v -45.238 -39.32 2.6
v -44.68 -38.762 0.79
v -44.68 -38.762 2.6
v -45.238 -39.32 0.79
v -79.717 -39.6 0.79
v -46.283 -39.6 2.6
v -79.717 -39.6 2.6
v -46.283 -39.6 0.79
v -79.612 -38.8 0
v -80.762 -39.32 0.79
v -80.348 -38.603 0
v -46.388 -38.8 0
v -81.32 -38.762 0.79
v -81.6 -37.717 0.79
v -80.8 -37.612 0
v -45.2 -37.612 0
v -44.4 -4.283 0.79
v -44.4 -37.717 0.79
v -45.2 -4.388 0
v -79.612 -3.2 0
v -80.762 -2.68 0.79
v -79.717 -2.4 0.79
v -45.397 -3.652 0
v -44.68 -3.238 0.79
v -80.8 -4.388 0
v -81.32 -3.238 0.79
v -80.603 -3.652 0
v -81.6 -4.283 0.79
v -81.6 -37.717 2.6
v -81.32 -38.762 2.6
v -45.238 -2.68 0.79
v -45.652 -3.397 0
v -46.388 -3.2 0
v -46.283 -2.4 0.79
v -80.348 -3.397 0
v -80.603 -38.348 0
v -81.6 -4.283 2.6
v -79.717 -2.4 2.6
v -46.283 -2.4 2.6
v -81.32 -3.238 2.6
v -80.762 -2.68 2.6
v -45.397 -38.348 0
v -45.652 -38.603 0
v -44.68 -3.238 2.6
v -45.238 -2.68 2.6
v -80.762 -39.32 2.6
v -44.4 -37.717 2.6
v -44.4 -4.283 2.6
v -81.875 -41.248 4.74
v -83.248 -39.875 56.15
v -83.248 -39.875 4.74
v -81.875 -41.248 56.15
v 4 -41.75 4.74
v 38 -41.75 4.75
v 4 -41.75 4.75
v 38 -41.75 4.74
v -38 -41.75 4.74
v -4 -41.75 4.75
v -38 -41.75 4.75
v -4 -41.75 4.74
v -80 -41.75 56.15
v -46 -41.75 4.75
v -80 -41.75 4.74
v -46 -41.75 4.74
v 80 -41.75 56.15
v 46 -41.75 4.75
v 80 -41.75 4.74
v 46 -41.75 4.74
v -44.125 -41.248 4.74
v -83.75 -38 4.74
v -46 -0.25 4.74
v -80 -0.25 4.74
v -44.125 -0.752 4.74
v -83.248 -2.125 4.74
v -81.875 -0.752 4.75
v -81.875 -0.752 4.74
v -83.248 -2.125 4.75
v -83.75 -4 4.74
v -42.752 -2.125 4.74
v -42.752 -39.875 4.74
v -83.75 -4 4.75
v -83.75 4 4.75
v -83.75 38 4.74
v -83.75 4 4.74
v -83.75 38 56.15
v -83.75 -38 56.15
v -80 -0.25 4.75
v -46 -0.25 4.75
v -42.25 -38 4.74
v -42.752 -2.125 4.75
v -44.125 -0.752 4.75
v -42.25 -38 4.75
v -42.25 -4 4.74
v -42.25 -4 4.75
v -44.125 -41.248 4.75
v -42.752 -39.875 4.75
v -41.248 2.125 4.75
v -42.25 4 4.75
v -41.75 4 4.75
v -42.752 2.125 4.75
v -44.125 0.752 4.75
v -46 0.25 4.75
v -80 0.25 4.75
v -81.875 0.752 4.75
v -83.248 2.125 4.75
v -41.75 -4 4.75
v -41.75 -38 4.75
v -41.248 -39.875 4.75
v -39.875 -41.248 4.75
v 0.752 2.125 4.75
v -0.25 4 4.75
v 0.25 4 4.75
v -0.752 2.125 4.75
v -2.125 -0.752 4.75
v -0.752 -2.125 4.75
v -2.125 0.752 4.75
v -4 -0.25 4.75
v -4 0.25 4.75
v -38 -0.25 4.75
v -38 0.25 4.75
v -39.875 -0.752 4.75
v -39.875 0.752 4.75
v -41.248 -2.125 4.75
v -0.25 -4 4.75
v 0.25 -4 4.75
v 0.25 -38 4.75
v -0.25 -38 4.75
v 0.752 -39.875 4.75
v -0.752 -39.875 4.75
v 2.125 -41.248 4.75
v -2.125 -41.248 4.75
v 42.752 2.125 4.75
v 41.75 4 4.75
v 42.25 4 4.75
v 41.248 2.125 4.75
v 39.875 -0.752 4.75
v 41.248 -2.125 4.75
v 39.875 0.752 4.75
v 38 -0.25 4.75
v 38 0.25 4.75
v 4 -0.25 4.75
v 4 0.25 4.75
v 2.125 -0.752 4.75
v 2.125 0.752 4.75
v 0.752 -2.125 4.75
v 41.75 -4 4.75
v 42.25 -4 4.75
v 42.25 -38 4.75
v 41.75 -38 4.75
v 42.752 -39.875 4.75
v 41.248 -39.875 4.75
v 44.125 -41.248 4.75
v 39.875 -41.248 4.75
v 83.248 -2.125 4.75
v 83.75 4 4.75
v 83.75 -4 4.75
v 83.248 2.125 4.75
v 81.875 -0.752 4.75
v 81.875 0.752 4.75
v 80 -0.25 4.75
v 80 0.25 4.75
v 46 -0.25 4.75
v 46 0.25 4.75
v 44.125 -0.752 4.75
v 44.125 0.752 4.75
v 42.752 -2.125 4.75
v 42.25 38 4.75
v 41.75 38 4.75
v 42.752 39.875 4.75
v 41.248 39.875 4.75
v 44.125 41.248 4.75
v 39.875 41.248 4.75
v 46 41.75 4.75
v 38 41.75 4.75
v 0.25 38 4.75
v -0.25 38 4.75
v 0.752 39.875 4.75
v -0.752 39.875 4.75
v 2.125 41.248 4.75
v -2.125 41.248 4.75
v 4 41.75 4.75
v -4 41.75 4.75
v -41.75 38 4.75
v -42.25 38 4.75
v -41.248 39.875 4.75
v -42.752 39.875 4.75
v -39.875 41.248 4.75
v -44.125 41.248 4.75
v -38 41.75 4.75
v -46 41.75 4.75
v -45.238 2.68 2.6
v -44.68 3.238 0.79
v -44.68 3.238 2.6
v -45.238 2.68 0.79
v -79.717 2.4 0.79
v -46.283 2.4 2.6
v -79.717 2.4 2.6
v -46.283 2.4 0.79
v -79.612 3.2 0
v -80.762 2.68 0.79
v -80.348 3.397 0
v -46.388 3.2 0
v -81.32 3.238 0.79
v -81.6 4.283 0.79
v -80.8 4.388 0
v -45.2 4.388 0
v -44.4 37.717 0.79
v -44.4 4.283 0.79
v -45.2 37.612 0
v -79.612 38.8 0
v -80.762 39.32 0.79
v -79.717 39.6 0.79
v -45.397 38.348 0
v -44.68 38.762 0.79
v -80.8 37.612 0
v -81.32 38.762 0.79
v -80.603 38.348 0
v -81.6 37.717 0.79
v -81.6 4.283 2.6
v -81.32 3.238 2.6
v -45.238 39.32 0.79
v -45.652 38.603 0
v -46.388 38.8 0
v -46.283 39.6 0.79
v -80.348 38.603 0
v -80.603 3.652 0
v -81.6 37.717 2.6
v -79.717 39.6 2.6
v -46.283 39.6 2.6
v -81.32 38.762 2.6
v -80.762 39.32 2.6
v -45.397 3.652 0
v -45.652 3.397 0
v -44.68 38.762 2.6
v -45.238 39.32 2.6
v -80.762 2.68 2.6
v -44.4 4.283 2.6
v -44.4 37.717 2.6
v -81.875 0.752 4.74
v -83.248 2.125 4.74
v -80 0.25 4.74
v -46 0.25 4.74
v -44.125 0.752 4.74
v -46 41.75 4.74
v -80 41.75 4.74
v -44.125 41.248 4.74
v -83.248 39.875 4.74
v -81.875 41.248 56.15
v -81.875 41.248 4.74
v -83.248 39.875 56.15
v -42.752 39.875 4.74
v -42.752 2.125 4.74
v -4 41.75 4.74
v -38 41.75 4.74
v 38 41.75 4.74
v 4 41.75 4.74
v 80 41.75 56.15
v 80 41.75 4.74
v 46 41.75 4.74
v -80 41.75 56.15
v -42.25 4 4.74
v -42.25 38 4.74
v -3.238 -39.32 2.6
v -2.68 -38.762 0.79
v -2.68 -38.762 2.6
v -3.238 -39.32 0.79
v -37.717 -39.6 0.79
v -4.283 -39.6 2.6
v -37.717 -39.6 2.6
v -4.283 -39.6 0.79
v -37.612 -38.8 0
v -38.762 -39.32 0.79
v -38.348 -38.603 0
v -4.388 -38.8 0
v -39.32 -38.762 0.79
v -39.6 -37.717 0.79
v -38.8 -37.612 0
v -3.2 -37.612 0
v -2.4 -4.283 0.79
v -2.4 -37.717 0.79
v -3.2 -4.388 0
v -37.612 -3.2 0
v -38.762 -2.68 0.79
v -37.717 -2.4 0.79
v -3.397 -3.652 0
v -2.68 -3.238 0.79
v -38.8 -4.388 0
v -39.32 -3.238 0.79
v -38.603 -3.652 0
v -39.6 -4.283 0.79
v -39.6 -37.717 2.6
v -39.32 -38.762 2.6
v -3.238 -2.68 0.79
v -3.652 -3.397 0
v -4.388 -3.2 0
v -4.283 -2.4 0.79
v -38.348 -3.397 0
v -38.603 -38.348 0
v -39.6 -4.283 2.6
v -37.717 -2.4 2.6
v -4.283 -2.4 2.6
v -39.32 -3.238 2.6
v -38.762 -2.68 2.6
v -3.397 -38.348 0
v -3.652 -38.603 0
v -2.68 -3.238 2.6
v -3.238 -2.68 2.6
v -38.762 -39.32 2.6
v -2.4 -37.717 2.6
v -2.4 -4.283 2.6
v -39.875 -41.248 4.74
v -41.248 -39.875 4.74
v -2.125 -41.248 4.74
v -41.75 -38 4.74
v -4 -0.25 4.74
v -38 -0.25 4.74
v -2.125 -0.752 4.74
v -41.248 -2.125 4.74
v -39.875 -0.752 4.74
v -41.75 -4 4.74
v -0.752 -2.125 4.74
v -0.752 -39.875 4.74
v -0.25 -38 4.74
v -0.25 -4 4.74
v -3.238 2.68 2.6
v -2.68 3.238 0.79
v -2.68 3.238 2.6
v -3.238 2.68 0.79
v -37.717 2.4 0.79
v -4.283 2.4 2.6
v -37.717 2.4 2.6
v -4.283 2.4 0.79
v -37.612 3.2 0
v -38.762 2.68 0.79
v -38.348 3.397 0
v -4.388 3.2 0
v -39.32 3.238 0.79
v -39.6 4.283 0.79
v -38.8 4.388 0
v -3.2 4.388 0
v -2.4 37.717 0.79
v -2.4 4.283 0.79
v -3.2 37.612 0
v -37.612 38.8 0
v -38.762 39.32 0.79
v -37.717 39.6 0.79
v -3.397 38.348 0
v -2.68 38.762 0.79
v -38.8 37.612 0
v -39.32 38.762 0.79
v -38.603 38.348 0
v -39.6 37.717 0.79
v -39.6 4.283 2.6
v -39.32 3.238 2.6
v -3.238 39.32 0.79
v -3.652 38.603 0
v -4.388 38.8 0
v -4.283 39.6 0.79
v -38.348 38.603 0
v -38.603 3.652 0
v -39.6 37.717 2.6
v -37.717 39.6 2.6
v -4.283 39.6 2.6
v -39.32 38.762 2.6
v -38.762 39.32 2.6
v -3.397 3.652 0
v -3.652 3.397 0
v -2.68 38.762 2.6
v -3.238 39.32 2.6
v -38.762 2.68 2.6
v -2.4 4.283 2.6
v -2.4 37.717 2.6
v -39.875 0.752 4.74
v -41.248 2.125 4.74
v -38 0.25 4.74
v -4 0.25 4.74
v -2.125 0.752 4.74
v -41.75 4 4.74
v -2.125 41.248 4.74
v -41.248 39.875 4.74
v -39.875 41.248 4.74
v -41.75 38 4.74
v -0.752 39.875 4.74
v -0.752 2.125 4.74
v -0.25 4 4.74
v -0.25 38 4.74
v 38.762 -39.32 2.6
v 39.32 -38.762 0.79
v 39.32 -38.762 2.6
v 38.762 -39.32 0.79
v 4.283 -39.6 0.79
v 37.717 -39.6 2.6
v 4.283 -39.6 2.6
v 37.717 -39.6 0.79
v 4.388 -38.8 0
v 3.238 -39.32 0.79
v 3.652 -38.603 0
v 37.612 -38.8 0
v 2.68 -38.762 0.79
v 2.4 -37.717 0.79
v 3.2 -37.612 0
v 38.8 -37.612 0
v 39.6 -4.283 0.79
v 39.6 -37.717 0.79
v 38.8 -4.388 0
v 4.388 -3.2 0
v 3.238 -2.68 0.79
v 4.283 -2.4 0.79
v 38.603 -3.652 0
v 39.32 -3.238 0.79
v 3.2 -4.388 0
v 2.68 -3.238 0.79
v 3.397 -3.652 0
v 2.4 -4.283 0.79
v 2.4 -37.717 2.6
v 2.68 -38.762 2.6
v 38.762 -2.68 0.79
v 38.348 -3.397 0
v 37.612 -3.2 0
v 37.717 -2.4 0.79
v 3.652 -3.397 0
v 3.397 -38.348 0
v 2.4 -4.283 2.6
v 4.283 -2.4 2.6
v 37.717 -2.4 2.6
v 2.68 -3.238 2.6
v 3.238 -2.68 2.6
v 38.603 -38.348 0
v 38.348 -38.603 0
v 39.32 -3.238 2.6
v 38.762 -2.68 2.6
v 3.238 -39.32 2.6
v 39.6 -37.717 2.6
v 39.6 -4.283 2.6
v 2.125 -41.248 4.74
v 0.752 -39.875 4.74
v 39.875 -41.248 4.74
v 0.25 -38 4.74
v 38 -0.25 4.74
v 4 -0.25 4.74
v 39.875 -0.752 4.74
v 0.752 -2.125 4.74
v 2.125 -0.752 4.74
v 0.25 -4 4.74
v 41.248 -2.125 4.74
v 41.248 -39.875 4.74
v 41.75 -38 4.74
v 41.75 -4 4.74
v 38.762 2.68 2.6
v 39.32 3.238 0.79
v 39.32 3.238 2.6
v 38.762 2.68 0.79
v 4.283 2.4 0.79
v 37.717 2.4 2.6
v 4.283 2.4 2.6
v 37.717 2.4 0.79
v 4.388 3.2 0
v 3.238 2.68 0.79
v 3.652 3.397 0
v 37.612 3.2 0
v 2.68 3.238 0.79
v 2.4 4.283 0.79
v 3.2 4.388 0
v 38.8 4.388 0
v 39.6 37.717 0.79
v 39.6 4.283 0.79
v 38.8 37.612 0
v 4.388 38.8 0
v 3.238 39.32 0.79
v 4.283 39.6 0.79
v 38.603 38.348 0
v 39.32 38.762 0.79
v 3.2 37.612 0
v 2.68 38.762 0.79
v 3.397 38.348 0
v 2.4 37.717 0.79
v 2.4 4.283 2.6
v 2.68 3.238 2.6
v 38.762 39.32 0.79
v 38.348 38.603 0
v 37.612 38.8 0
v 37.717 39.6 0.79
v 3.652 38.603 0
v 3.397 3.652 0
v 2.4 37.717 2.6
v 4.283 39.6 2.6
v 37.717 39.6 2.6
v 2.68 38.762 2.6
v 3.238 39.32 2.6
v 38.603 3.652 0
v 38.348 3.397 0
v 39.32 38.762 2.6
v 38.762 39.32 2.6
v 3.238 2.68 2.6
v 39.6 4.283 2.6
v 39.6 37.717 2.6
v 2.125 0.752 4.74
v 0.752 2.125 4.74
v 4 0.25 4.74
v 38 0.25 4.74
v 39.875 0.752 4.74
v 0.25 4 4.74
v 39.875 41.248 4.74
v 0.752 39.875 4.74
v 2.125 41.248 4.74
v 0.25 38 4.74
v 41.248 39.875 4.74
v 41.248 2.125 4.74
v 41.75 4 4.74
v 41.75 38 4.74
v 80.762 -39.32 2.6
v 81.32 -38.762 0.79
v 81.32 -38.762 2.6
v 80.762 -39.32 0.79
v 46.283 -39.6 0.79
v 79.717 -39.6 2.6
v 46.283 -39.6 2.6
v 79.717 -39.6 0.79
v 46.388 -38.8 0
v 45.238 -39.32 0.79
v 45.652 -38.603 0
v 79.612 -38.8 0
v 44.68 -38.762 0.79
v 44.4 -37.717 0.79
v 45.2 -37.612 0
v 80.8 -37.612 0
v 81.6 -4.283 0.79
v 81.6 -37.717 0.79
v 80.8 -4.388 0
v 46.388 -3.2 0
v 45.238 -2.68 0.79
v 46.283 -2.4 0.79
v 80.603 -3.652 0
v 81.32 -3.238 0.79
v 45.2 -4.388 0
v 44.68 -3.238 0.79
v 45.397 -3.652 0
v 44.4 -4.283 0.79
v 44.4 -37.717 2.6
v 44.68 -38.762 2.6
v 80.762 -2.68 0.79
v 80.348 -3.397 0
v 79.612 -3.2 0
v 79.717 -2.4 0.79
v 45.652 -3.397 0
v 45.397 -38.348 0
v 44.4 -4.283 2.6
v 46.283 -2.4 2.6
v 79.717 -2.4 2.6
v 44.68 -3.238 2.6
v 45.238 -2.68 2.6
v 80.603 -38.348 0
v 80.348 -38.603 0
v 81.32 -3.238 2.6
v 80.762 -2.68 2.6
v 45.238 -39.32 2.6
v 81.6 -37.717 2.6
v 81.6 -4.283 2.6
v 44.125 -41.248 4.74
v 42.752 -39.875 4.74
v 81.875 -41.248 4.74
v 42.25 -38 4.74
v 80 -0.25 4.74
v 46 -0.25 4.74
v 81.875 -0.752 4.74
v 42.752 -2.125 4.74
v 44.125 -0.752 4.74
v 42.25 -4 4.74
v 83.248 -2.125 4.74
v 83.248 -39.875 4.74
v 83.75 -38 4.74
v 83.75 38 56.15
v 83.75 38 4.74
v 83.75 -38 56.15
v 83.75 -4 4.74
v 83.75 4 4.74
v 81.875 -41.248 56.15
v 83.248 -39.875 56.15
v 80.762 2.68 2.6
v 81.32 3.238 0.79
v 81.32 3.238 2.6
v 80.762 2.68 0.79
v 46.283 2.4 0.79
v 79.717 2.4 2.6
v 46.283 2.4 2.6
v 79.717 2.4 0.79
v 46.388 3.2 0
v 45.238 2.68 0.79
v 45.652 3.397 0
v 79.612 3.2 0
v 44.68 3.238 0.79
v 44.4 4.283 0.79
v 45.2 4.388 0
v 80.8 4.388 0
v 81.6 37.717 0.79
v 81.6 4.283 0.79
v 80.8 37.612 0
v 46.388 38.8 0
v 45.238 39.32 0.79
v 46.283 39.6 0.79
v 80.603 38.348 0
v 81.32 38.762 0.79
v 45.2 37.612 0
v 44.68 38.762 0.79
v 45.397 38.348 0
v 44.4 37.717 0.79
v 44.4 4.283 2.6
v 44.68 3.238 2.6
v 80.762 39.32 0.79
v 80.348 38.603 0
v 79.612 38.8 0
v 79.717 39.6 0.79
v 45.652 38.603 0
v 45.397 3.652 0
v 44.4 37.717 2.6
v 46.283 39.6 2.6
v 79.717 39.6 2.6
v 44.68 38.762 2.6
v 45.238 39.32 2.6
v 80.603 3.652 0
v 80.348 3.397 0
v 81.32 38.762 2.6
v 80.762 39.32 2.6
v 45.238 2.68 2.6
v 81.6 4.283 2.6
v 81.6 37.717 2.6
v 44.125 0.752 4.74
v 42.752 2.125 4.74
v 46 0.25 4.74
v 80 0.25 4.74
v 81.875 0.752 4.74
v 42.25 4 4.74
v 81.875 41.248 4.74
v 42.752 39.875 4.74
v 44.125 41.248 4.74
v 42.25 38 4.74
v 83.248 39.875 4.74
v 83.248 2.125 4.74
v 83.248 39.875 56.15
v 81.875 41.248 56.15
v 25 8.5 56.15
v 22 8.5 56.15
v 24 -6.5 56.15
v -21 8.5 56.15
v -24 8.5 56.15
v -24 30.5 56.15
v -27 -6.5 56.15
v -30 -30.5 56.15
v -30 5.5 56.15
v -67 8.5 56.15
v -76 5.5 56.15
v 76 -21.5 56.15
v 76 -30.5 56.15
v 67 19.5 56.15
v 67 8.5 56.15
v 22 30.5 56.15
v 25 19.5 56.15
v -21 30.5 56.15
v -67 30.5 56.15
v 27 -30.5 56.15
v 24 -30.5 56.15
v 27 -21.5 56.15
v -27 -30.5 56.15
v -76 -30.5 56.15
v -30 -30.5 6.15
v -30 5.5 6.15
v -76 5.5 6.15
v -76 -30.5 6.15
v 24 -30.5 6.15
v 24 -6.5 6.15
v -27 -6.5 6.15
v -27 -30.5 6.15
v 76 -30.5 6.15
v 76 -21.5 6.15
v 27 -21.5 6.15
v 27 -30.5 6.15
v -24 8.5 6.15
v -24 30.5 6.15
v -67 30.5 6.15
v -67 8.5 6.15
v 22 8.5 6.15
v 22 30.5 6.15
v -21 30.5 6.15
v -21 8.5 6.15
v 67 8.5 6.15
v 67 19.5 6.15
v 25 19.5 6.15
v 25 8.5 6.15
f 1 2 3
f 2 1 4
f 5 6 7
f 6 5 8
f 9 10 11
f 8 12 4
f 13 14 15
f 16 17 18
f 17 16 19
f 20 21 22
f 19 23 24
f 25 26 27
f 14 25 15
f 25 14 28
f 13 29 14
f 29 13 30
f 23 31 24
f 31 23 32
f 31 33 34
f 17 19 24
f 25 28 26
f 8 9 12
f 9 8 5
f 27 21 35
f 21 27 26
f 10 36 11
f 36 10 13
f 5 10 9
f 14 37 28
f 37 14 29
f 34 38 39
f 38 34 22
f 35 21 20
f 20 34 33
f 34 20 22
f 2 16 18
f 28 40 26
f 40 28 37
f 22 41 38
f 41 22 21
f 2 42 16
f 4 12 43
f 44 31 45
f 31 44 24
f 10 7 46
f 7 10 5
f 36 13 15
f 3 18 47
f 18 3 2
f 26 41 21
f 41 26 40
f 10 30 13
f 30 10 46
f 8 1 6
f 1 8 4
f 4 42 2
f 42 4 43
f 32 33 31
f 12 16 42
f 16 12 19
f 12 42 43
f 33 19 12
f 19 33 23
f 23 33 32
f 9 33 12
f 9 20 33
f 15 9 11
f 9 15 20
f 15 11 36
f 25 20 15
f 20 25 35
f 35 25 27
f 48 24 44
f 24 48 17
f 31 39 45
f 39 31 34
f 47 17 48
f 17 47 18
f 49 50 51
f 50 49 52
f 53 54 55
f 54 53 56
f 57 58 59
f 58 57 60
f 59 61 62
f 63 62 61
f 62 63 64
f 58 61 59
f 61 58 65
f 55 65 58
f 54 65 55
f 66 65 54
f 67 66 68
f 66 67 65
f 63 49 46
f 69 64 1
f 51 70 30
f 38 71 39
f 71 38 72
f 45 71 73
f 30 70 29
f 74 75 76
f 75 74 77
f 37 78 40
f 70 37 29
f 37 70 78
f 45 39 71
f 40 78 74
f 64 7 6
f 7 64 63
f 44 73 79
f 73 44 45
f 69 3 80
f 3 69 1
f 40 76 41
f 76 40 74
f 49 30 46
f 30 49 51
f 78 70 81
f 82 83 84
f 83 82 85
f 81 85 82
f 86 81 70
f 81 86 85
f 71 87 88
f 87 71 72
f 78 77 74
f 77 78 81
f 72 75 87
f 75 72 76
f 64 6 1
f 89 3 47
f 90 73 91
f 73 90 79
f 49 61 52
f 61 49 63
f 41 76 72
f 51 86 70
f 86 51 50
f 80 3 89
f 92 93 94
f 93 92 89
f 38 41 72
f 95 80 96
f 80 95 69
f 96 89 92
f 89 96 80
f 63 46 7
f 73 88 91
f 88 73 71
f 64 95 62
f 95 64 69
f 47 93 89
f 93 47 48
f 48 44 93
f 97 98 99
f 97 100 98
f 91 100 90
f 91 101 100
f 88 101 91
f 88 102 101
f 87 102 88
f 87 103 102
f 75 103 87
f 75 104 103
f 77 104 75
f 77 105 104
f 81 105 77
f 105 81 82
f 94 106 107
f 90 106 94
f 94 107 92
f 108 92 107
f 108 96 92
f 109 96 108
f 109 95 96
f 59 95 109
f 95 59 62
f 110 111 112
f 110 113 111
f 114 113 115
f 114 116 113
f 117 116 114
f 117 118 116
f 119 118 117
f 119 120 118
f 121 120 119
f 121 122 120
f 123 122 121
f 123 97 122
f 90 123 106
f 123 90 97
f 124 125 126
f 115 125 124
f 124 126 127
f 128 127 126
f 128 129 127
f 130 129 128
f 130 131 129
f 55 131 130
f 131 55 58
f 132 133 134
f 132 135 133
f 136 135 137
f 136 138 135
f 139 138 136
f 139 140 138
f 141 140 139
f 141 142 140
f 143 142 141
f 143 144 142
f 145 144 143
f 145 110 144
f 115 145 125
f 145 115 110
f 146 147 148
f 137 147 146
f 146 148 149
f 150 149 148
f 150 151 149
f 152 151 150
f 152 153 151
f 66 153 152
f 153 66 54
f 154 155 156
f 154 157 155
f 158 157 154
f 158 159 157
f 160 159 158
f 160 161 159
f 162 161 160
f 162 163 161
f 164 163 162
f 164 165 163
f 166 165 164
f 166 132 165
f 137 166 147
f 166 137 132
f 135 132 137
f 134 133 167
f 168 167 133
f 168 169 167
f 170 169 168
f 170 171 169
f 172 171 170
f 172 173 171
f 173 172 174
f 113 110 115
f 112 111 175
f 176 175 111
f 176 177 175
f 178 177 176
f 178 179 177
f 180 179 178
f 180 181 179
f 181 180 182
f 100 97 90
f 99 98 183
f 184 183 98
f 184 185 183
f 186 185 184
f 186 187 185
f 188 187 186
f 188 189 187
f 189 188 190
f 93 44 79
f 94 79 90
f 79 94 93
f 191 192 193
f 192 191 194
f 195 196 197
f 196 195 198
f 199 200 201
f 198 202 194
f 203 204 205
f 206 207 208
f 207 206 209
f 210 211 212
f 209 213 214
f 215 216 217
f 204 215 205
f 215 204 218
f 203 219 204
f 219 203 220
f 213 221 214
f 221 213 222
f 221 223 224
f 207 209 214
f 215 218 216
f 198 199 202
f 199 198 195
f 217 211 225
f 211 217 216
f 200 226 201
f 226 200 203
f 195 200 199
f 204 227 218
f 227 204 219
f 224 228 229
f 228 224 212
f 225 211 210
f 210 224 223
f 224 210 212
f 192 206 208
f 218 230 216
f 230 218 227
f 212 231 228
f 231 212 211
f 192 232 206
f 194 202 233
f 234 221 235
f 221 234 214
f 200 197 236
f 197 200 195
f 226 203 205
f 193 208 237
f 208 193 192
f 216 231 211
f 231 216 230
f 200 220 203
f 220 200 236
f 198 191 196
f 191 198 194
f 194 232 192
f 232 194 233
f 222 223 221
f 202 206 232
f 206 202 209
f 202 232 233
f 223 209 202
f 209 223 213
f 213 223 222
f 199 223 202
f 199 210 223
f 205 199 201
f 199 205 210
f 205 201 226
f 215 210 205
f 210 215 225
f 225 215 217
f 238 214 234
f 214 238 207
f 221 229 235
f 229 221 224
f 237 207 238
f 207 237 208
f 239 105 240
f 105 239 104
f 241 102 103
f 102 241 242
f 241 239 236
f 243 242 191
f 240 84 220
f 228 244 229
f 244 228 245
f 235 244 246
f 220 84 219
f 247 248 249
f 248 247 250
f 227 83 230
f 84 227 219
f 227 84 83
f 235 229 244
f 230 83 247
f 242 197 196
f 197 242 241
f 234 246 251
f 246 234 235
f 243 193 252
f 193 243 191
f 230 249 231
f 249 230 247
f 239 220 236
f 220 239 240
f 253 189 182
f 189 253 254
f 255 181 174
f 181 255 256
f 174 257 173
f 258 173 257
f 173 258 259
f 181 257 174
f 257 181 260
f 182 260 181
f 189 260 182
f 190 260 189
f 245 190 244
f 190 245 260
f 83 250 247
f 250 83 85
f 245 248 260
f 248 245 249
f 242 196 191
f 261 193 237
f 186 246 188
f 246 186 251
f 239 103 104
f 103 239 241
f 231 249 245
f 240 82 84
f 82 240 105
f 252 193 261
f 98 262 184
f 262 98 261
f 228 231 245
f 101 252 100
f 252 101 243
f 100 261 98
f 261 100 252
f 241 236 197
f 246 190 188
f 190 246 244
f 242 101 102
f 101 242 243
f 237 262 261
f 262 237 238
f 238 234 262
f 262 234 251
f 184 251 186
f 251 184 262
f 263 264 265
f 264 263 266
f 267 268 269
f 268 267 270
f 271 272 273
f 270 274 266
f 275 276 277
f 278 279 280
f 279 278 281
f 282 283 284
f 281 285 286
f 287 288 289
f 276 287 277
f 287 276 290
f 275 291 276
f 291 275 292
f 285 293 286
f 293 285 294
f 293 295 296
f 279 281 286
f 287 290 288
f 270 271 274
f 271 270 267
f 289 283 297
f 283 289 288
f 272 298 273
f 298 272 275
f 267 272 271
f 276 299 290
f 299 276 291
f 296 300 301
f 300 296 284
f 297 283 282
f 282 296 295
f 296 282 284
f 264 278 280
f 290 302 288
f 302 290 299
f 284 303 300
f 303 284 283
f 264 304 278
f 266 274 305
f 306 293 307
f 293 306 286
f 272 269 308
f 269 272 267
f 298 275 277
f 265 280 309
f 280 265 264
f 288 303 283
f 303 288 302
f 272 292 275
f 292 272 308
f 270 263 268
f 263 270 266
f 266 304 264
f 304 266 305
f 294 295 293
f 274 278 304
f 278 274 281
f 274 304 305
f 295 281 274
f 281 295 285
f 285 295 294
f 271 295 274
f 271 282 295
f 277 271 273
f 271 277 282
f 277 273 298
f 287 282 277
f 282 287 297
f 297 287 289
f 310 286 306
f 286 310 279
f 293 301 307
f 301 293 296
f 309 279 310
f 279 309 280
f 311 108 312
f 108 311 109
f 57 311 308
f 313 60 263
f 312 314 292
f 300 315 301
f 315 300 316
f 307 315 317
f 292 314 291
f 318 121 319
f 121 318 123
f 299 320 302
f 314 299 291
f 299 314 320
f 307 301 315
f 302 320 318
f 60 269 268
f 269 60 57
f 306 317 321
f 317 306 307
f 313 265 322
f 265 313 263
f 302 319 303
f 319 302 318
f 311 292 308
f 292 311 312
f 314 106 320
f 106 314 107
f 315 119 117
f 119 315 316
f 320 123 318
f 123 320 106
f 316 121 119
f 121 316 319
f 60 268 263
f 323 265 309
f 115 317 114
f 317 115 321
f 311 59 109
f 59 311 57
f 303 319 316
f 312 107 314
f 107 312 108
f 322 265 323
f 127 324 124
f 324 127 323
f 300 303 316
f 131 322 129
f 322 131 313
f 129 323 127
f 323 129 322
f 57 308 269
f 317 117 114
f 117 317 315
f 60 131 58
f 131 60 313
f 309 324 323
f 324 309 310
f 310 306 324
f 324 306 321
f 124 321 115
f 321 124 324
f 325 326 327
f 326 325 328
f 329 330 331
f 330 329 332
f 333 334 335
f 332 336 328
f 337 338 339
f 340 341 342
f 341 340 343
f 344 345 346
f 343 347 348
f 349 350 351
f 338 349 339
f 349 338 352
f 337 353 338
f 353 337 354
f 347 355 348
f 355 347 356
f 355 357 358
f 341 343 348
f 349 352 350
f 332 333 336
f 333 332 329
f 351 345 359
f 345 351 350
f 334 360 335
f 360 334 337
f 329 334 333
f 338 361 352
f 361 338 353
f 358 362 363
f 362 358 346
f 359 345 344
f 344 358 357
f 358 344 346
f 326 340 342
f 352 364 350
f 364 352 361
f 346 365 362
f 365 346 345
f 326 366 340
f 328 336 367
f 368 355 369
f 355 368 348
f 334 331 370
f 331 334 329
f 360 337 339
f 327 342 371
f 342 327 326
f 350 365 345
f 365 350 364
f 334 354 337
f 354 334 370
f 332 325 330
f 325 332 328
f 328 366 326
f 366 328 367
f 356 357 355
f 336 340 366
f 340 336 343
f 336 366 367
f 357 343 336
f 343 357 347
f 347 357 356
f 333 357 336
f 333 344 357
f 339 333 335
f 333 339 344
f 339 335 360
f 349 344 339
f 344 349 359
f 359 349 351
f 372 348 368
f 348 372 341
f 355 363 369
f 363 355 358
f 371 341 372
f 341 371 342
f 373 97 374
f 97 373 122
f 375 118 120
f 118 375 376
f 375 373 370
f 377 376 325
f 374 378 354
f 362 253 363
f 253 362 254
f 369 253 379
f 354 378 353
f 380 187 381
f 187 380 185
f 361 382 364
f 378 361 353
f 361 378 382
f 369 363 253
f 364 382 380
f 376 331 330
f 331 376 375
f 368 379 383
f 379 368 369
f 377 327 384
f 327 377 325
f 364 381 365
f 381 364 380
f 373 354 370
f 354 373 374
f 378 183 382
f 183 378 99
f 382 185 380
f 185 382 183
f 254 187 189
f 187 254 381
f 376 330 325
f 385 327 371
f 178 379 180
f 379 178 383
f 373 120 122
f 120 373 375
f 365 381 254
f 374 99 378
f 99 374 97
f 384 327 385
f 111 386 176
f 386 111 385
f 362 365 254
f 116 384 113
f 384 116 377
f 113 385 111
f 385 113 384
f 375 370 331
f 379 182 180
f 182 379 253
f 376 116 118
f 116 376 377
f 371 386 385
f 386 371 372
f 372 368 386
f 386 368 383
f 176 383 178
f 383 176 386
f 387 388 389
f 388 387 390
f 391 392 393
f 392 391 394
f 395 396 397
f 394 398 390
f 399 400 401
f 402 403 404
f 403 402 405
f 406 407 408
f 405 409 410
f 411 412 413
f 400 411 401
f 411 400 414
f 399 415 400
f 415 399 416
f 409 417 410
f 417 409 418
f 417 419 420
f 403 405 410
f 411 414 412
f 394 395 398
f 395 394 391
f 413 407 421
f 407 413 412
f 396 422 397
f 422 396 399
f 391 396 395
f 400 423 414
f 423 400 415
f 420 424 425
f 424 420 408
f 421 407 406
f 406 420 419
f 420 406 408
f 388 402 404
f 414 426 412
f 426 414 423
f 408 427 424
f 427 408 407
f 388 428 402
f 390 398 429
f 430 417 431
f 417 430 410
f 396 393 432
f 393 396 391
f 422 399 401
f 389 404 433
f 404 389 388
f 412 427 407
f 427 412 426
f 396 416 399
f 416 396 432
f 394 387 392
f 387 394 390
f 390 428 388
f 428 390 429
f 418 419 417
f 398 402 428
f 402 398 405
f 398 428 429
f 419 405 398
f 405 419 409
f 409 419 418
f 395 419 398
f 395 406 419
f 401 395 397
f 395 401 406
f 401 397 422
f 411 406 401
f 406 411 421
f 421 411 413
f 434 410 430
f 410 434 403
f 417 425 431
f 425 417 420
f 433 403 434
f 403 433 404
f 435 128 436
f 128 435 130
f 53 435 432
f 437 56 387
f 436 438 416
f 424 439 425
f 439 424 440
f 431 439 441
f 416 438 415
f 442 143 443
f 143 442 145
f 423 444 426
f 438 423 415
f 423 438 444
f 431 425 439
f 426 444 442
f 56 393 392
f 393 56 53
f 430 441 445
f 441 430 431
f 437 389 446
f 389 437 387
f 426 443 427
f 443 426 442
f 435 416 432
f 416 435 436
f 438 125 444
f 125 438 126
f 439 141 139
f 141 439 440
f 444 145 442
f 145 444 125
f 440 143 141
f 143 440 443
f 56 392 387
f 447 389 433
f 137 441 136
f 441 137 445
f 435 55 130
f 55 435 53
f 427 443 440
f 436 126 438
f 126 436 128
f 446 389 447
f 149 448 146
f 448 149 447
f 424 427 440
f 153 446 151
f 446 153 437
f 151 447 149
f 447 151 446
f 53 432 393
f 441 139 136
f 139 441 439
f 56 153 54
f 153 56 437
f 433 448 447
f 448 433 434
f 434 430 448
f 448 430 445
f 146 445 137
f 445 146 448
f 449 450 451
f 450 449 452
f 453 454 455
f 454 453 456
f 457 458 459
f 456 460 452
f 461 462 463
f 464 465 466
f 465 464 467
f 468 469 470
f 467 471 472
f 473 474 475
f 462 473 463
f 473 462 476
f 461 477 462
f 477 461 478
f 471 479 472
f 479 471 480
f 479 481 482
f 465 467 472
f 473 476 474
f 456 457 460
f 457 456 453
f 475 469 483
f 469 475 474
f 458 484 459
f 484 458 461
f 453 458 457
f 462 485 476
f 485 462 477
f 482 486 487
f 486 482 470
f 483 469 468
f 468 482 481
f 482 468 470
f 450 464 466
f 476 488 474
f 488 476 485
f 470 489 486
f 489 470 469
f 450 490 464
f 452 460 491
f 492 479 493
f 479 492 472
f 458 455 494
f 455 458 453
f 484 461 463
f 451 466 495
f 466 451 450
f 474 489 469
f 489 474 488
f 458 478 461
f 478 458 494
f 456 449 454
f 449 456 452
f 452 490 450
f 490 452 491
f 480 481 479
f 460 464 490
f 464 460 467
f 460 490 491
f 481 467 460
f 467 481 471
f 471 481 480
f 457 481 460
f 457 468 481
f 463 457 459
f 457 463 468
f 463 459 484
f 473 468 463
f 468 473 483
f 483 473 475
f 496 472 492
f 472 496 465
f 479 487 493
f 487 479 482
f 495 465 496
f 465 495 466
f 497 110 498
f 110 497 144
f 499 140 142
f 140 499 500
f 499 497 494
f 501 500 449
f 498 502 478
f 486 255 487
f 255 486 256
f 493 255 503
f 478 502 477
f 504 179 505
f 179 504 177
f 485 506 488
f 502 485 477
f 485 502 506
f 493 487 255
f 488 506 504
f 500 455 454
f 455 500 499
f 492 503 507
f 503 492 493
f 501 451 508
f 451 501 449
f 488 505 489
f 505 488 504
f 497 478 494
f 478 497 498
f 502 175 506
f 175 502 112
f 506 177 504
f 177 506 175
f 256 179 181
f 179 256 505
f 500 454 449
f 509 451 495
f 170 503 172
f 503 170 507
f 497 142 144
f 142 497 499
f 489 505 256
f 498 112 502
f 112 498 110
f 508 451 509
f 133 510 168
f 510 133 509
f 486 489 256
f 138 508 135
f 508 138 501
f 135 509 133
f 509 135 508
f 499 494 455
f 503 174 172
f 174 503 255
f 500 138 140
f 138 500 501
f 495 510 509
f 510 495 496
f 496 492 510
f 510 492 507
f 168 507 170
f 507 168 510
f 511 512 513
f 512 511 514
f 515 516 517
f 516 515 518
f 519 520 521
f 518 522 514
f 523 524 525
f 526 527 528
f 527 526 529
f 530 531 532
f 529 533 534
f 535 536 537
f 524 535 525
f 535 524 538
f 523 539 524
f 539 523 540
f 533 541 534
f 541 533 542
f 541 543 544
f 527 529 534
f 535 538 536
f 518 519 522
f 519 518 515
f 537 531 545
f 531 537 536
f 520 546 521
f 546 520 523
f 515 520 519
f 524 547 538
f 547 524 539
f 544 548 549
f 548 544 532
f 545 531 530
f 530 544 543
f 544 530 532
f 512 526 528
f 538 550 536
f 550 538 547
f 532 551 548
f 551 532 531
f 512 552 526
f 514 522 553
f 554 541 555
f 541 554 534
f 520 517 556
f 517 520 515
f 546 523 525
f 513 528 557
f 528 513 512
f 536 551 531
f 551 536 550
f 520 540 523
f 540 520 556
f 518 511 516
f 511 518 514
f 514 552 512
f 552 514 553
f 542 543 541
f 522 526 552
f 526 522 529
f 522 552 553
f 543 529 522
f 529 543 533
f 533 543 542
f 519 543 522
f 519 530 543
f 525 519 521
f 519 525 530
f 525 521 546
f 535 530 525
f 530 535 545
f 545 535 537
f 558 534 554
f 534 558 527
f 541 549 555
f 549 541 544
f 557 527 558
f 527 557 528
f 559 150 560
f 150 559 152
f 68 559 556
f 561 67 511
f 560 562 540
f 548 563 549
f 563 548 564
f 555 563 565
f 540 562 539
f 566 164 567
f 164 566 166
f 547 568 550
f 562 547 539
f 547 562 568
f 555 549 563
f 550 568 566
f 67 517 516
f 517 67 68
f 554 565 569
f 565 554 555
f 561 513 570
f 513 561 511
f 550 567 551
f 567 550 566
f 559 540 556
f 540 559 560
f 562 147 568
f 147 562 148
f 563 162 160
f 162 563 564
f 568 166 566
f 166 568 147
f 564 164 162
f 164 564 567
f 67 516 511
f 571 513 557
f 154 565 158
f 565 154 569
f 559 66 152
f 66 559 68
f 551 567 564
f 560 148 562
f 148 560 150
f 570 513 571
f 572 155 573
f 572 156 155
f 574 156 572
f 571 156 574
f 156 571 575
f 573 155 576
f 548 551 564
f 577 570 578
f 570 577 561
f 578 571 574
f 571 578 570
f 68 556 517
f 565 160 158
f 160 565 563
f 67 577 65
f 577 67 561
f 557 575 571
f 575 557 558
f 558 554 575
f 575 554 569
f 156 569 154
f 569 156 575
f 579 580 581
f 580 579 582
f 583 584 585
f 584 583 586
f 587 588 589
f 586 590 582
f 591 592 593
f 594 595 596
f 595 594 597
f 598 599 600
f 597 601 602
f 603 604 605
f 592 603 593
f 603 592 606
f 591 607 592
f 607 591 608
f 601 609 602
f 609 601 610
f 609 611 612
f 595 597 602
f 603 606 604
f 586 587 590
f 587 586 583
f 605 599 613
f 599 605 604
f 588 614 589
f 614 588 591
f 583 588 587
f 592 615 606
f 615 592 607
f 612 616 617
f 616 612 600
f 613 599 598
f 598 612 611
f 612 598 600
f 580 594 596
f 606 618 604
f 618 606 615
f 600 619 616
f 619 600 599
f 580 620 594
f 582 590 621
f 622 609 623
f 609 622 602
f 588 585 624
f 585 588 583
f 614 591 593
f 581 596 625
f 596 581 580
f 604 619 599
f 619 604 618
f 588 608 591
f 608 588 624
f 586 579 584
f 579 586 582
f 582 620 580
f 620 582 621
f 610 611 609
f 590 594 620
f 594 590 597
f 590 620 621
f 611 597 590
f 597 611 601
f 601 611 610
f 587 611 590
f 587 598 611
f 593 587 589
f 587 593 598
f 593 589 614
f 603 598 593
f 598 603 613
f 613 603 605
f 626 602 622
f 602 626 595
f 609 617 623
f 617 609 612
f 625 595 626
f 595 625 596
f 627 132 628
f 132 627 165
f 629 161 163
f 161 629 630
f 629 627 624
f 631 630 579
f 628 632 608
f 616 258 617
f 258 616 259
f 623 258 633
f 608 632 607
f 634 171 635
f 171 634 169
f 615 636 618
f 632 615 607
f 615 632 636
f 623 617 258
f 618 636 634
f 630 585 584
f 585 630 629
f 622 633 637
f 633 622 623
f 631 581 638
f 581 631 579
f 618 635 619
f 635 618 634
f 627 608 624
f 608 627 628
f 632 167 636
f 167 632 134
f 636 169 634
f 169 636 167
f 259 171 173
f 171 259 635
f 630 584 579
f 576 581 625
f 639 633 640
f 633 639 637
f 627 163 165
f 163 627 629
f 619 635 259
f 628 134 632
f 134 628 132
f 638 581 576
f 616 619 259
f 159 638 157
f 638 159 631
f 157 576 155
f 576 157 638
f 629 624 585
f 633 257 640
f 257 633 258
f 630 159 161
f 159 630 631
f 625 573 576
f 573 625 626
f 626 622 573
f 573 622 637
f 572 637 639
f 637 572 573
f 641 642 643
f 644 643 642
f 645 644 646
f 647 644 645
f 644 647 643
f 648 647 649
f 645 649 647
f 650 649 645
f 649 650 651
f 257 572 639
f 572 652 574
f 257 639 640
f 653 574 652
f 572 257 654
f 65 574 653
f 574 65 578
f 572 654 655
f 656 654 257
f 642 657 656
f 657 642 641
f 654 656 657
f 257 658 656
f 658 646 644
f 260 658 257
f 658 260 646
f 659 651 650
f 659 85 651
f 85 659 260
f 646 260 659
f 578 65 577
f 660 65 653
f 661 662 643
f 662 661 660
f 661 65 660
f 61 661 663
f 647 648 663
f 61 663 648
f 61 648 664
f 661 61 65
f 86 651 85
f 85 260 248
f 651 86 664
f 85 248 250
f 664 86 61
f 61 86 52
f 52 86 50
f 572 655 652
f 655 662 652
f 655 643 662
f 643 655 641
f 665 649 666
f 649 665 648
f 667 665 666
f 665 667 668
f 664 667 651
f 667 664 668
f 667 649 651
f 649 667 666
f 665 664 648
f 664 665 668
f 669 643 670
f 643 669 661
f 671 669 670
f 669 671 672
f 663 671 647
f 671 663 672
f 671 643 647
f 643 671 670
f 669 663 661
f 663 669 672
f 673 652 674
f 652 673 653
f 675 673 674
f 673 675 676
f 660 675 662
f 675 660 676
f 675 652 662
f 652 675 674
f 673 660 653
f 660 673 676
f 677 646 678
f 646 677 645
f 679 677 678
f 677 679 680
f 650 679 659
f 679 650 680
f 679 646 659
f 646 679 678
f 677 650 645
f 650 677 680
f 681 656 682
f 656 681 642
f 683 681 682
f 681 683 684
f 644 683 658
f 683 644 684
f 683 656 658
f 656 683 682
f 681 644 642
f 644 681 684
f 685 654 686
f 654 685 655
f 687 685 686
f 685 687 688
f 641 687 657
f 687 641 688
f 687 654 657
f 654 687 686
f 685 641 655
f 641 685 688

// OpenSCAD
// tray_remotes — 4×2 tray, two rows of three, one sized slot per remote,
// each standing on end.
//
// HOW YOU USE IT:
//   Each remote stands upright in its own slot, cut to that remote's width and
//   thickness. You grab the one you want by the top and lift it straight out.
//   Nothing has to be moved to reach anything else, and a remote can only go back
//   in its own slot. Every remote stands 40 mm or more proud of the tray, so the
//   back row is grabbed over the front row, not dug out from behind it.
//
// WHY SLOTS AND NOT ONE BIN: six remotes in a common well fall over each other
// and you dig. The narrowest here is 8 mm thick and the widest 35 — in a shared
// well the thin ones just lie down.
//
// WHY TWO ROWS, AND WHY THE 6×1 IS GONE. There are TWO Roku remotes, not one.
// Six remotes are 268 mm of width; with clearance and 3 mm dividers that is
// 289 mm of slot. A 6×1 has 249.1 mm of interior — short by 40. The width that
// would hold them is a 7×1 at 293.5 mm outer, which is past the 270 bed. So the
// row folds in half: 4×2, three slots front, three back.
//
// That also buys back the dividers. The 6×1 ran DIV = 2 because at 3 it needed
// 249.0 against 249.1 available, which is not a fit, it is a coincidence. The
// 4×2's widest row needs 152 of 165.1, so the dividers go to the usual 3 mm and
// stop being the thing holding the design together.
//
// ROWS ARE SPLIT BY THICKNESS, not by which remote you use most. Each row is
// only as deep as its own thickest member, so putting the 35 mm LG and the 8 mm
// fume extractor in the same row costs nothing, while spreading the thick ones
// across both rows would make both rows 36 mm deep and blow the Y budget.
//
// SLOTS ARE FRONT-ALIGNED WITHIN A ROW. The faces present at one line, so each
// row reads as a row. Back-aligning would stagger the fronts and bury the thin
// ones.
//
// PRINT: as emitted, feet down. No supports.
//
// SPDX-License-Identifier: CC-BY-NC-4.0
// Copyright (c) 2026 Aaron Cupp
include <../lib/gridfinity.scad>

CLR    = 1.0;   // [0.5:0.1:2] per dimension, on both width and thickness

// ⚠️ BUTTON_BULGE IS AN ALLOWANCE, NOT A MEASUREMENT.
//
// The Insignia jammed on its own buttons the moment it entered the slot. 20 mm
// is the thickness of the BODY; the feature that actually has to pass through
// the slot is the button crown, which stands proud of it and was never measured.
// This is the tip-tinner bug again — the 42.5 mm lid was measured where the
// 38.38 mm body was the thing that had to fit.
//
// 3.0 is a guess at a rubber-button crown, giving 4.0 mm of total thickness
// clearance where the body alone would get 1.0. If it still catches, the fix is
// NOT to raise this further by feel: put calipers across the remote AT THE
// BUTTONS and make that the thickness in the table.
BUTTON_BULGE = 3.0;   // [0:0.5:6]

// [name, width, thickness, extra thickness allowance]
// Widths and thicknesses measured 2026-08-20. Lengths run 90 to ~180 mm.
ROWS = [
    // back row — depth set by the 35 mm LG
    [["LG 4K TV",    45, 35, 0],
     ["Insignia TV", 50, 20, BUTTON_BULGE],
     ["Fume ext",    48,  8, 0]],
    // front row — depth set by the Rokus
    [["Roku",        42, 21, 0],
     ["Roku",        42, 21, 0],
     ["Scope cam",   41, 10, 0]],
];

NX = 4; NY = 2;
CAPTURE = 50;   // [30:1:80] slot depth, and a compromise between two ends of the
                //   range. The shortest remote is 90, so 50 holds over half of it
                //   and still leaves 40 to grab; go deeper and the short ones get
                //   hard to pinch out. The longest is ~180 and stands 130 proud —
                //   fine, because the slot grips its full width and thickness like
                //   a book in a shelf. A round bore could not do that.
DIV    = 3.0;   // [1.6:0.2:5] wall between slots in a row
ROWDIV = 3.0;   // [1.6:0.2:5] wall between the two rows
WALL   = 1.2;
FLOOR  = 1.4;

W = NX*GF - 0.5; D = NY*GF - 0.5;
IW = W - 2*WALL; ID = D - 2*WALL;
Z0 = BIN_BASE_H + FLOOR;
H  = Z0 + CAPTURE;

function sum_upto(v, i) = i <= 0 ? 0 : v[i-1] + sum_upto(v, i-1);
function lmax(v, i)     = i >= len(v) ? 0 : max(v[i], lmax(v, i+1));

// slot footprint: X is the remote's width, Y its thickness plus any allowance
function slot_w(r) = r[1] + CLR;
function slot_d(r) = r[2] + CLR + r[3];

ROW_PITCH = [for (row = ROWS) [for (r = row) slot_w(r) + DIV]];
ROW_NEED  = [for (row = ROWS)
                sum_upto([for (r = row) slot_w(r)], len(row)) + DIV*(len(row) - 1)];
ROW_DEPTH = [for (row = ROWS) lmax([for (r = row) slot_d(r)], 0)];

Y_NEED   = sum_upto(ROW_DEPTH, len(ROWS)) + ROWDIV*(len(ROWS) - 1);
Y_MARGIN = (ID - Y_NEED) / 2;

for (i = [0 : len(ROWS) - 1])
    assert((IW - ROW_NEED[i])/2 >= 2,
           str("Row ", i, " needs ", ROW_NEED[i], " of ", IW,
               " — widen the tray or thin DIV."));
assert(Y_MARGIN >= 2, str("Rows need ", Y_NEED, " of ", ID,
                          " — only ", Y_MARGIN, " mm front and back."));
echo(str("rows need ", ROW_NEED, " of ", IW, " wide; ", Y_NEED, " of ", ID,
         " deep (", Y_MARGIN, " mm margin front and back)"));

difference() {
    bin_blank(NX, NY, H);
    for (ri = [0 : len(ROWS) - 1]) {
        row  = ROWS[ri];
        // front edge of this row, measured from the front of the interior
        y0   = -ID/2 + Y_MARGIN + sum_upto(ROW_DEPTH, ri) + ri*ROWDIV;
        marg = (IW - ROW_NEED[ri]) / 2;
        for (i = [0 : len(row) - 1])
            translate([-IW/2 + marg + sum_upto(ROW_PITCH[ri], i), y0, Z0])
                cube([slot_w(row[i]), slot_d(row[i]), CAPTURE + 0.1]);
    }
}
